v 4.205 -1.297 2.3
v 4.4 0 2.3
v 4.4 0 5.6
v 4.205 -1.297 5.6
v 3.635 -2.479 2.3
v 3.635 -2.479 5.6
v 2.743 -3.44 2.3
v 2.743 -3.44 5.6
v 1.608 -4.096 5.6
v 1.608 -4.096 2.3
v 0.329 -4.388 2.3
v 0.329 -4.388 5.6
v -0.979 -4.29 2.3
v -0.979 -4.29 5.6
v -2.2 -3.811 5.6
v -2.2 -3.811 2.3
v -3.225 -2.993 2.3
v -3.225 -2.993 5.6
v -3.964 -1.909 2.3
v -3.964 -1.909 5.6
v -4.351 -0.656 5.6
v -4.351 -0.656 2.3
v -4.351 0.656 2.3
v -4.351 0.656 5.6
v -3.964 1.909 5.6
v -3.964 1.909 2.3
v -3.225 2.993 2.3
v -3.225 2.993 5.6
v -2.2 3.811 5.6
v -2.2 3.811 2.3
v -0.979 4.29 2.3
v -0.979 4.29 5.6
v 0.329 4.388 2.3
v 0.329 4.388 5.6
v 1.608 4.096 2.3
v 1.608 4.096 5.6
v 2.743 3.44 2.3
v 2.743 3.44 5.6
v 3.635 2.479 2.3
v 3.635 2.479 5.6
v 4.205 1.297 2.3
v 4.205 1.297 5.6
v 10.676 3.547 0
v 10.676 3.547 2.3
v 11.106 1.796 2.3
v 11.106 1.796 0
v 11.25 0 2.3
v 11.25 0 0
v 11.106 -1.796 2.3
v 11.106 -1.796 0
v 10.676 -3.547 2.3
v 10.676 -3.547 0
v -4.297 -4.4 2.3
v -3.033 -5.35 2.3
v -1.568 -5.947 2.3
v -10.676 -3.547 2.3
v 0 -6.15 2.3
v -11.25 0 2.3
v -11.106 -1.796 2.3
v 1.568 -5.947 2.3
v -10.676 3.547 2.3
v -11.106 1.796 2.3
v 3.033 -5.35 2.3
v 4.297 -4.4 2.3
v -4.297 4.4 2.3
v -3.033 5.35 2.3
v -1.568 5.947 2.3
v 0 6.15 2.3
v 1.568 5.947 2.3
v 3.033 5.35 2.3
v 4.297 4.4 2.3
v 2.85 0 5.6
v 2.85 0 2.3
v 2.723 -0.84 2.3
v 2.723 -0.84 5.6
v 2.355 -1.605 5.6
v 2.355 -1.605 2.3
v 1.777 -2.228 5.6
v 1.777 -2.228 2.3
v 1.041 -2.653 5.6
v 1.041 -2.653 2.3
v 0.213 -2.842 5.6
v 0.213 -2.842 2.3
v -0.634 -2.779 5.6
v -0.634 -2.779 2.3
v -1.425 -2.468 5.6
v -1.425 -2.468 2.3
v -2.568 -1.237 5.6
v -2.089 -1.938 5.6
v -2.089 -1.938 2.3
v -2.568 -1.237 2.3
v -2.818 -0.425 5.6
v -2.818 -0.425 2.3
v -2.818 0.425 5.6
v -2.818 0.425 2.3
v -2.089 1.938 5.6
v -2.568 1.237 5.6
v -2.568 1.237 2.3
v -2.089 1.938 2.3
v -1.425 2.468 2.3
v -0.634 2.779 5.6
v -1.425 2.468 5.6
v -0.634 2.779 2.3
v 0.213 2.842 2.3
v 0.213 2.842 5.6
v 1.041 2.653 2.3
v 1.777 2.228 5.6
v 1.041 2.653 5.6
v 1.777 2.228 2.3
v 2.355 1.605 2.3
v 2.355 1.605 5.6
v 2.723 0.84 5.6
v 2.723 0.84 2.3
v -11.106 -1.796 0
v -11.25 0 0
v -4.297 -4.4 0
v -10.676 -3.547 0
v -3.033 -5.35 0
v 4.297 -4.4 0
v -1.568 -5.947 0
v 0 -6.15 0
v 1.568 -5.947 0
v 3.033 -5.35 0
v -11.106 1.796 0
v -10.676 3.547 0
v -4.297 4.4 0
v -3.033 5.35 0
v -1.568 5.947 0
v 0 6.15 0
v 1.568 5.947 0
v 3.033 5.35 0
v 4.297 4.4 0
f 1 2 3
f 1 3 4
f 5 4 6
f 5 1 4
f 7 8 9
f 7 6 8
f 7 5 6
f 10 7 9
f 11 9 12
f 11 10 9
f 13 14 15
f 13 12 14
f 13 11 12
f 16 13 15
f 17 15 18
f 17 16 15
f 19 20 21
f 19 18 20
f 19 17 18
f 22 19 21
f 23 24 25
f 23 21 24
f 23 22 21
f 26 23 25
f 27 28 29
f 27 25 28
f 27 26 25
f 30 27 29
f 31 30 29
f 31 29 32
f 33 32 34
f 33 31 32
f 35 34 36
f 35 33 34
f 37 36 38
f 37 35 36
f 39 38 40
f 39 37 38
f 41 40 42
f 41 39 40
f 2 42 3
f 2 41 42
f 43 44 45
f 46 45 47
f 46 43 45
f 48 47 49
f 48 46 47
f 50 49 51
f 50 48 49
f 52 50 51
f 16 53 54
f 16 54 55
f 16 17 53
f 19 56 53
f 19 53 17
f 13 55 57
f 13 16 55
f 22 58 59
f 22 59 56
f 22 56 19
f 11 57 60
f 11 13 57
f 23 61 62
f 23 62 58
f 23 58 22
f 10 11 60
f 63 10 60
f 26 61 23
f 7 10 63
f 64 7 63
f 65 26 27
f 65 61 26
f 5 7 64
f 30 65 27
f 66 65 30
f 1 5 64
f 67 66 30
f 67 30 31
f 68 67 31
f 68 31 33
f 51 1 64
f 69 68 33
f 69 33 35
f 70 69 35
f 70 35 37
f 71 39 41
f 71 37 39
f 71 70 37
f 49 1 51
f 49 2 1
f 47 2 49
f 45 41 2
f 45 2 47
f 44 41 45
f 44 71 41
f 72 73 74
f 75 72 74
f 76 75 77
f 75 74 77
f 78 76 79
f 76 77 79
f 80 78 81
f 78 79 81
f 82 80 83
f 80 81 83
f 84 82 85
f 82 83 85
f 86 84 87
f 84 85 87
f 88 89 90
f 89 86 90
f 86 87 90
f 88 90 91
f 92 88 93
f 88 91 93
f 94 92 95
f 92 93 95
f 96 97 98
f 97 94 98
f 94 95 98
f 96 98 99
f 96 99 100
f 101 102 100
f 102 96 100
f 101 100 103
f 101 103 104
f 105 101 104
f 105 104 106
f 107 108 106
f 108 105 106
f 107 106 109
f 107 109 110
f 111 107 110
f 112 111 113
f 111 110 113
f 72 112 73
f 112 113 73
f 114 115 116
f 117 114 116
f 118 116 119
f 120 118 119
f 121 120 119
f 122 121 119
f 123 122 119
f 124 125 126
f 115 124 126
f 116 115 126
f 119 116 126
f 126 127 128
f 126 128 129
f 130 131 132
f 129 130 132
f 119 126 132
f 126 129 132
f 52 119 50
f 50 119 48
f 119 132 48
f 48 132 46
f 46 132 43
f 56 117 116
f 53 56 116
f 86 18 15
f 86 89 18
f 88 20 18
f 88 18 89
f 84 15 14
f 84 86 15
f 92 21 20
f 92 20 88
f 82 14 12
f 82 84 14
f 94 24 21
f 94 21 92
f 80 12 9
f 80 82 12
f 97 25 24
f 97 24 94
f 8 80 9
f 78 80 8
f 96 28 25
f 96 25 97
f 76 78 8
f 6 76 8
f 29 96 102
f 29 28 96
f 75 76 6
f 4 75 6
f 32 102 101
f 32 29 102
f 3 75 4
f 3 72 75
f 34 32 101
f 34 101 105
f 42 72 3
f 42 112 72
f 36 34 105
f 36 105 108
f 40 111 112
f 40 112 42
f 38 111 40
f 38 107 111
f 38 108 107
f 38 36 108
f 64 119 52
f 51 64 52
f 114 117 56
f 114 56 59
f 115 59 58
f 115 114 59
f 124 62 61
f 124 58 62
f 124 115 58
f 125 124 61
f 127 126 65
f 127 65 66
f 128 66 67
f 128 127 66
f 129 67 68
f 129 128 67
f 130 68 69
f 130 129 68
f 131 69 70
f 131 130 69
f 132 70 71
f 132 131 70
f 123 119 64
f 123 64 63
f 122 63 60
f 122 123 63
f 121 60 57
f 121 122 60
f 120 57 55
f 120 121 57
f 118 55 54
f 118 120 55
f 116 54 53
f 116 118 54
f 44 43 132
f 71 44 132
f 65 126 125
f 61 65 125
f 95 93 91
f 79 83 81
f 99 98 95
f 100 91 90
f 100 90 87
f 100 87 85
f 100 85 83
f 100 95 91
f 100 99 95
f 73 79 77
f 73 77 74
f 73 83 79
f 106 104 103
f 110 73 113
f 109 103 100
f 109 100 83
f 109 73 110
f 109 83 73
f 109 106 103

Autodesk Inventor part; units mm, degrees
ref_plane "YZ Plane" through (0, 0, 0) normal (1, 0, 0) x (0, 1, 0)
ref_plane "XZ Plane" through (0, 0, 0) normal (0, 1, 0) x (-1, 0, 0)
ref_plane "XY Plane" through (0, 0, 0) normal (0, 0, 1) x (1, 0, 0)
sketch "Sketch1" plane through (0, 0, 0) normal (0, 0, 1) x (1, 0, 0)
  circle A0 centre (0, 0) radius 6.15
  line L0 (-4.2968, 4.4) -> (-16.8146, 2.7257)
  arc A1 (-16.8146, 2.7257) -> (-16.8146, -2.7257) centre (-16.45, 0) ccw
  line L1 (-16.8146, -2.7257) -> (-4.2968, -4.4)
  line L2 (4.2968, -4.4) -> (16.8146, -2.7257)
  arc A2 (16.8146, -2.7257) -> (16.8146, 2.7257) centre (16.45, 0) ccw
  line L3 (16.8146, 2.7257) -> (4.2968, 4.4)
  line L4 (-4.2968, -4.4) -> (4.2968, -4.4) construction
  line L5 (-4.2968, 4.4) -> (4.2968, 4.4) construction
  line L6 (-19.2, 0) -> (19.2, 0) construction
  circle A3 centre (0, 0) radius 11.25
  point P0 (-10.6763, 3.5467)
  point P1 (-10.6763, -3.5467)
  point P2 (10.6763, 3.5467)
  point P3 (10.6763, -3.5467)
  dimension "d0" = 12.3
  dimension "d1" = 8.8
  dimension "d2" = 38.4
  dimension "d3" = 2.75
  dimension "d10" = 22.5
extrude "Extrusion1" add sketch "Sketch1" along normal blind 2.3 contours A0 | A0 L3 A3 L2 | A0 L1 A3 L0
sketch "Sketch2" plane through (0, 0, 2.3) normal (0, 0, 1) x (1, 0, 0)
  circle A0 centre (0, 0) radius 4.4
  circle A1 centre (0, 0) radius 2.85
  dimension "d6" = 8.8
  dimension "d7" = 5.7
extrude "Extrusion2" add sketch "Sketch2" along normal blind 3.3
properties part number "attachment_real" material "Nylon 6/6"
